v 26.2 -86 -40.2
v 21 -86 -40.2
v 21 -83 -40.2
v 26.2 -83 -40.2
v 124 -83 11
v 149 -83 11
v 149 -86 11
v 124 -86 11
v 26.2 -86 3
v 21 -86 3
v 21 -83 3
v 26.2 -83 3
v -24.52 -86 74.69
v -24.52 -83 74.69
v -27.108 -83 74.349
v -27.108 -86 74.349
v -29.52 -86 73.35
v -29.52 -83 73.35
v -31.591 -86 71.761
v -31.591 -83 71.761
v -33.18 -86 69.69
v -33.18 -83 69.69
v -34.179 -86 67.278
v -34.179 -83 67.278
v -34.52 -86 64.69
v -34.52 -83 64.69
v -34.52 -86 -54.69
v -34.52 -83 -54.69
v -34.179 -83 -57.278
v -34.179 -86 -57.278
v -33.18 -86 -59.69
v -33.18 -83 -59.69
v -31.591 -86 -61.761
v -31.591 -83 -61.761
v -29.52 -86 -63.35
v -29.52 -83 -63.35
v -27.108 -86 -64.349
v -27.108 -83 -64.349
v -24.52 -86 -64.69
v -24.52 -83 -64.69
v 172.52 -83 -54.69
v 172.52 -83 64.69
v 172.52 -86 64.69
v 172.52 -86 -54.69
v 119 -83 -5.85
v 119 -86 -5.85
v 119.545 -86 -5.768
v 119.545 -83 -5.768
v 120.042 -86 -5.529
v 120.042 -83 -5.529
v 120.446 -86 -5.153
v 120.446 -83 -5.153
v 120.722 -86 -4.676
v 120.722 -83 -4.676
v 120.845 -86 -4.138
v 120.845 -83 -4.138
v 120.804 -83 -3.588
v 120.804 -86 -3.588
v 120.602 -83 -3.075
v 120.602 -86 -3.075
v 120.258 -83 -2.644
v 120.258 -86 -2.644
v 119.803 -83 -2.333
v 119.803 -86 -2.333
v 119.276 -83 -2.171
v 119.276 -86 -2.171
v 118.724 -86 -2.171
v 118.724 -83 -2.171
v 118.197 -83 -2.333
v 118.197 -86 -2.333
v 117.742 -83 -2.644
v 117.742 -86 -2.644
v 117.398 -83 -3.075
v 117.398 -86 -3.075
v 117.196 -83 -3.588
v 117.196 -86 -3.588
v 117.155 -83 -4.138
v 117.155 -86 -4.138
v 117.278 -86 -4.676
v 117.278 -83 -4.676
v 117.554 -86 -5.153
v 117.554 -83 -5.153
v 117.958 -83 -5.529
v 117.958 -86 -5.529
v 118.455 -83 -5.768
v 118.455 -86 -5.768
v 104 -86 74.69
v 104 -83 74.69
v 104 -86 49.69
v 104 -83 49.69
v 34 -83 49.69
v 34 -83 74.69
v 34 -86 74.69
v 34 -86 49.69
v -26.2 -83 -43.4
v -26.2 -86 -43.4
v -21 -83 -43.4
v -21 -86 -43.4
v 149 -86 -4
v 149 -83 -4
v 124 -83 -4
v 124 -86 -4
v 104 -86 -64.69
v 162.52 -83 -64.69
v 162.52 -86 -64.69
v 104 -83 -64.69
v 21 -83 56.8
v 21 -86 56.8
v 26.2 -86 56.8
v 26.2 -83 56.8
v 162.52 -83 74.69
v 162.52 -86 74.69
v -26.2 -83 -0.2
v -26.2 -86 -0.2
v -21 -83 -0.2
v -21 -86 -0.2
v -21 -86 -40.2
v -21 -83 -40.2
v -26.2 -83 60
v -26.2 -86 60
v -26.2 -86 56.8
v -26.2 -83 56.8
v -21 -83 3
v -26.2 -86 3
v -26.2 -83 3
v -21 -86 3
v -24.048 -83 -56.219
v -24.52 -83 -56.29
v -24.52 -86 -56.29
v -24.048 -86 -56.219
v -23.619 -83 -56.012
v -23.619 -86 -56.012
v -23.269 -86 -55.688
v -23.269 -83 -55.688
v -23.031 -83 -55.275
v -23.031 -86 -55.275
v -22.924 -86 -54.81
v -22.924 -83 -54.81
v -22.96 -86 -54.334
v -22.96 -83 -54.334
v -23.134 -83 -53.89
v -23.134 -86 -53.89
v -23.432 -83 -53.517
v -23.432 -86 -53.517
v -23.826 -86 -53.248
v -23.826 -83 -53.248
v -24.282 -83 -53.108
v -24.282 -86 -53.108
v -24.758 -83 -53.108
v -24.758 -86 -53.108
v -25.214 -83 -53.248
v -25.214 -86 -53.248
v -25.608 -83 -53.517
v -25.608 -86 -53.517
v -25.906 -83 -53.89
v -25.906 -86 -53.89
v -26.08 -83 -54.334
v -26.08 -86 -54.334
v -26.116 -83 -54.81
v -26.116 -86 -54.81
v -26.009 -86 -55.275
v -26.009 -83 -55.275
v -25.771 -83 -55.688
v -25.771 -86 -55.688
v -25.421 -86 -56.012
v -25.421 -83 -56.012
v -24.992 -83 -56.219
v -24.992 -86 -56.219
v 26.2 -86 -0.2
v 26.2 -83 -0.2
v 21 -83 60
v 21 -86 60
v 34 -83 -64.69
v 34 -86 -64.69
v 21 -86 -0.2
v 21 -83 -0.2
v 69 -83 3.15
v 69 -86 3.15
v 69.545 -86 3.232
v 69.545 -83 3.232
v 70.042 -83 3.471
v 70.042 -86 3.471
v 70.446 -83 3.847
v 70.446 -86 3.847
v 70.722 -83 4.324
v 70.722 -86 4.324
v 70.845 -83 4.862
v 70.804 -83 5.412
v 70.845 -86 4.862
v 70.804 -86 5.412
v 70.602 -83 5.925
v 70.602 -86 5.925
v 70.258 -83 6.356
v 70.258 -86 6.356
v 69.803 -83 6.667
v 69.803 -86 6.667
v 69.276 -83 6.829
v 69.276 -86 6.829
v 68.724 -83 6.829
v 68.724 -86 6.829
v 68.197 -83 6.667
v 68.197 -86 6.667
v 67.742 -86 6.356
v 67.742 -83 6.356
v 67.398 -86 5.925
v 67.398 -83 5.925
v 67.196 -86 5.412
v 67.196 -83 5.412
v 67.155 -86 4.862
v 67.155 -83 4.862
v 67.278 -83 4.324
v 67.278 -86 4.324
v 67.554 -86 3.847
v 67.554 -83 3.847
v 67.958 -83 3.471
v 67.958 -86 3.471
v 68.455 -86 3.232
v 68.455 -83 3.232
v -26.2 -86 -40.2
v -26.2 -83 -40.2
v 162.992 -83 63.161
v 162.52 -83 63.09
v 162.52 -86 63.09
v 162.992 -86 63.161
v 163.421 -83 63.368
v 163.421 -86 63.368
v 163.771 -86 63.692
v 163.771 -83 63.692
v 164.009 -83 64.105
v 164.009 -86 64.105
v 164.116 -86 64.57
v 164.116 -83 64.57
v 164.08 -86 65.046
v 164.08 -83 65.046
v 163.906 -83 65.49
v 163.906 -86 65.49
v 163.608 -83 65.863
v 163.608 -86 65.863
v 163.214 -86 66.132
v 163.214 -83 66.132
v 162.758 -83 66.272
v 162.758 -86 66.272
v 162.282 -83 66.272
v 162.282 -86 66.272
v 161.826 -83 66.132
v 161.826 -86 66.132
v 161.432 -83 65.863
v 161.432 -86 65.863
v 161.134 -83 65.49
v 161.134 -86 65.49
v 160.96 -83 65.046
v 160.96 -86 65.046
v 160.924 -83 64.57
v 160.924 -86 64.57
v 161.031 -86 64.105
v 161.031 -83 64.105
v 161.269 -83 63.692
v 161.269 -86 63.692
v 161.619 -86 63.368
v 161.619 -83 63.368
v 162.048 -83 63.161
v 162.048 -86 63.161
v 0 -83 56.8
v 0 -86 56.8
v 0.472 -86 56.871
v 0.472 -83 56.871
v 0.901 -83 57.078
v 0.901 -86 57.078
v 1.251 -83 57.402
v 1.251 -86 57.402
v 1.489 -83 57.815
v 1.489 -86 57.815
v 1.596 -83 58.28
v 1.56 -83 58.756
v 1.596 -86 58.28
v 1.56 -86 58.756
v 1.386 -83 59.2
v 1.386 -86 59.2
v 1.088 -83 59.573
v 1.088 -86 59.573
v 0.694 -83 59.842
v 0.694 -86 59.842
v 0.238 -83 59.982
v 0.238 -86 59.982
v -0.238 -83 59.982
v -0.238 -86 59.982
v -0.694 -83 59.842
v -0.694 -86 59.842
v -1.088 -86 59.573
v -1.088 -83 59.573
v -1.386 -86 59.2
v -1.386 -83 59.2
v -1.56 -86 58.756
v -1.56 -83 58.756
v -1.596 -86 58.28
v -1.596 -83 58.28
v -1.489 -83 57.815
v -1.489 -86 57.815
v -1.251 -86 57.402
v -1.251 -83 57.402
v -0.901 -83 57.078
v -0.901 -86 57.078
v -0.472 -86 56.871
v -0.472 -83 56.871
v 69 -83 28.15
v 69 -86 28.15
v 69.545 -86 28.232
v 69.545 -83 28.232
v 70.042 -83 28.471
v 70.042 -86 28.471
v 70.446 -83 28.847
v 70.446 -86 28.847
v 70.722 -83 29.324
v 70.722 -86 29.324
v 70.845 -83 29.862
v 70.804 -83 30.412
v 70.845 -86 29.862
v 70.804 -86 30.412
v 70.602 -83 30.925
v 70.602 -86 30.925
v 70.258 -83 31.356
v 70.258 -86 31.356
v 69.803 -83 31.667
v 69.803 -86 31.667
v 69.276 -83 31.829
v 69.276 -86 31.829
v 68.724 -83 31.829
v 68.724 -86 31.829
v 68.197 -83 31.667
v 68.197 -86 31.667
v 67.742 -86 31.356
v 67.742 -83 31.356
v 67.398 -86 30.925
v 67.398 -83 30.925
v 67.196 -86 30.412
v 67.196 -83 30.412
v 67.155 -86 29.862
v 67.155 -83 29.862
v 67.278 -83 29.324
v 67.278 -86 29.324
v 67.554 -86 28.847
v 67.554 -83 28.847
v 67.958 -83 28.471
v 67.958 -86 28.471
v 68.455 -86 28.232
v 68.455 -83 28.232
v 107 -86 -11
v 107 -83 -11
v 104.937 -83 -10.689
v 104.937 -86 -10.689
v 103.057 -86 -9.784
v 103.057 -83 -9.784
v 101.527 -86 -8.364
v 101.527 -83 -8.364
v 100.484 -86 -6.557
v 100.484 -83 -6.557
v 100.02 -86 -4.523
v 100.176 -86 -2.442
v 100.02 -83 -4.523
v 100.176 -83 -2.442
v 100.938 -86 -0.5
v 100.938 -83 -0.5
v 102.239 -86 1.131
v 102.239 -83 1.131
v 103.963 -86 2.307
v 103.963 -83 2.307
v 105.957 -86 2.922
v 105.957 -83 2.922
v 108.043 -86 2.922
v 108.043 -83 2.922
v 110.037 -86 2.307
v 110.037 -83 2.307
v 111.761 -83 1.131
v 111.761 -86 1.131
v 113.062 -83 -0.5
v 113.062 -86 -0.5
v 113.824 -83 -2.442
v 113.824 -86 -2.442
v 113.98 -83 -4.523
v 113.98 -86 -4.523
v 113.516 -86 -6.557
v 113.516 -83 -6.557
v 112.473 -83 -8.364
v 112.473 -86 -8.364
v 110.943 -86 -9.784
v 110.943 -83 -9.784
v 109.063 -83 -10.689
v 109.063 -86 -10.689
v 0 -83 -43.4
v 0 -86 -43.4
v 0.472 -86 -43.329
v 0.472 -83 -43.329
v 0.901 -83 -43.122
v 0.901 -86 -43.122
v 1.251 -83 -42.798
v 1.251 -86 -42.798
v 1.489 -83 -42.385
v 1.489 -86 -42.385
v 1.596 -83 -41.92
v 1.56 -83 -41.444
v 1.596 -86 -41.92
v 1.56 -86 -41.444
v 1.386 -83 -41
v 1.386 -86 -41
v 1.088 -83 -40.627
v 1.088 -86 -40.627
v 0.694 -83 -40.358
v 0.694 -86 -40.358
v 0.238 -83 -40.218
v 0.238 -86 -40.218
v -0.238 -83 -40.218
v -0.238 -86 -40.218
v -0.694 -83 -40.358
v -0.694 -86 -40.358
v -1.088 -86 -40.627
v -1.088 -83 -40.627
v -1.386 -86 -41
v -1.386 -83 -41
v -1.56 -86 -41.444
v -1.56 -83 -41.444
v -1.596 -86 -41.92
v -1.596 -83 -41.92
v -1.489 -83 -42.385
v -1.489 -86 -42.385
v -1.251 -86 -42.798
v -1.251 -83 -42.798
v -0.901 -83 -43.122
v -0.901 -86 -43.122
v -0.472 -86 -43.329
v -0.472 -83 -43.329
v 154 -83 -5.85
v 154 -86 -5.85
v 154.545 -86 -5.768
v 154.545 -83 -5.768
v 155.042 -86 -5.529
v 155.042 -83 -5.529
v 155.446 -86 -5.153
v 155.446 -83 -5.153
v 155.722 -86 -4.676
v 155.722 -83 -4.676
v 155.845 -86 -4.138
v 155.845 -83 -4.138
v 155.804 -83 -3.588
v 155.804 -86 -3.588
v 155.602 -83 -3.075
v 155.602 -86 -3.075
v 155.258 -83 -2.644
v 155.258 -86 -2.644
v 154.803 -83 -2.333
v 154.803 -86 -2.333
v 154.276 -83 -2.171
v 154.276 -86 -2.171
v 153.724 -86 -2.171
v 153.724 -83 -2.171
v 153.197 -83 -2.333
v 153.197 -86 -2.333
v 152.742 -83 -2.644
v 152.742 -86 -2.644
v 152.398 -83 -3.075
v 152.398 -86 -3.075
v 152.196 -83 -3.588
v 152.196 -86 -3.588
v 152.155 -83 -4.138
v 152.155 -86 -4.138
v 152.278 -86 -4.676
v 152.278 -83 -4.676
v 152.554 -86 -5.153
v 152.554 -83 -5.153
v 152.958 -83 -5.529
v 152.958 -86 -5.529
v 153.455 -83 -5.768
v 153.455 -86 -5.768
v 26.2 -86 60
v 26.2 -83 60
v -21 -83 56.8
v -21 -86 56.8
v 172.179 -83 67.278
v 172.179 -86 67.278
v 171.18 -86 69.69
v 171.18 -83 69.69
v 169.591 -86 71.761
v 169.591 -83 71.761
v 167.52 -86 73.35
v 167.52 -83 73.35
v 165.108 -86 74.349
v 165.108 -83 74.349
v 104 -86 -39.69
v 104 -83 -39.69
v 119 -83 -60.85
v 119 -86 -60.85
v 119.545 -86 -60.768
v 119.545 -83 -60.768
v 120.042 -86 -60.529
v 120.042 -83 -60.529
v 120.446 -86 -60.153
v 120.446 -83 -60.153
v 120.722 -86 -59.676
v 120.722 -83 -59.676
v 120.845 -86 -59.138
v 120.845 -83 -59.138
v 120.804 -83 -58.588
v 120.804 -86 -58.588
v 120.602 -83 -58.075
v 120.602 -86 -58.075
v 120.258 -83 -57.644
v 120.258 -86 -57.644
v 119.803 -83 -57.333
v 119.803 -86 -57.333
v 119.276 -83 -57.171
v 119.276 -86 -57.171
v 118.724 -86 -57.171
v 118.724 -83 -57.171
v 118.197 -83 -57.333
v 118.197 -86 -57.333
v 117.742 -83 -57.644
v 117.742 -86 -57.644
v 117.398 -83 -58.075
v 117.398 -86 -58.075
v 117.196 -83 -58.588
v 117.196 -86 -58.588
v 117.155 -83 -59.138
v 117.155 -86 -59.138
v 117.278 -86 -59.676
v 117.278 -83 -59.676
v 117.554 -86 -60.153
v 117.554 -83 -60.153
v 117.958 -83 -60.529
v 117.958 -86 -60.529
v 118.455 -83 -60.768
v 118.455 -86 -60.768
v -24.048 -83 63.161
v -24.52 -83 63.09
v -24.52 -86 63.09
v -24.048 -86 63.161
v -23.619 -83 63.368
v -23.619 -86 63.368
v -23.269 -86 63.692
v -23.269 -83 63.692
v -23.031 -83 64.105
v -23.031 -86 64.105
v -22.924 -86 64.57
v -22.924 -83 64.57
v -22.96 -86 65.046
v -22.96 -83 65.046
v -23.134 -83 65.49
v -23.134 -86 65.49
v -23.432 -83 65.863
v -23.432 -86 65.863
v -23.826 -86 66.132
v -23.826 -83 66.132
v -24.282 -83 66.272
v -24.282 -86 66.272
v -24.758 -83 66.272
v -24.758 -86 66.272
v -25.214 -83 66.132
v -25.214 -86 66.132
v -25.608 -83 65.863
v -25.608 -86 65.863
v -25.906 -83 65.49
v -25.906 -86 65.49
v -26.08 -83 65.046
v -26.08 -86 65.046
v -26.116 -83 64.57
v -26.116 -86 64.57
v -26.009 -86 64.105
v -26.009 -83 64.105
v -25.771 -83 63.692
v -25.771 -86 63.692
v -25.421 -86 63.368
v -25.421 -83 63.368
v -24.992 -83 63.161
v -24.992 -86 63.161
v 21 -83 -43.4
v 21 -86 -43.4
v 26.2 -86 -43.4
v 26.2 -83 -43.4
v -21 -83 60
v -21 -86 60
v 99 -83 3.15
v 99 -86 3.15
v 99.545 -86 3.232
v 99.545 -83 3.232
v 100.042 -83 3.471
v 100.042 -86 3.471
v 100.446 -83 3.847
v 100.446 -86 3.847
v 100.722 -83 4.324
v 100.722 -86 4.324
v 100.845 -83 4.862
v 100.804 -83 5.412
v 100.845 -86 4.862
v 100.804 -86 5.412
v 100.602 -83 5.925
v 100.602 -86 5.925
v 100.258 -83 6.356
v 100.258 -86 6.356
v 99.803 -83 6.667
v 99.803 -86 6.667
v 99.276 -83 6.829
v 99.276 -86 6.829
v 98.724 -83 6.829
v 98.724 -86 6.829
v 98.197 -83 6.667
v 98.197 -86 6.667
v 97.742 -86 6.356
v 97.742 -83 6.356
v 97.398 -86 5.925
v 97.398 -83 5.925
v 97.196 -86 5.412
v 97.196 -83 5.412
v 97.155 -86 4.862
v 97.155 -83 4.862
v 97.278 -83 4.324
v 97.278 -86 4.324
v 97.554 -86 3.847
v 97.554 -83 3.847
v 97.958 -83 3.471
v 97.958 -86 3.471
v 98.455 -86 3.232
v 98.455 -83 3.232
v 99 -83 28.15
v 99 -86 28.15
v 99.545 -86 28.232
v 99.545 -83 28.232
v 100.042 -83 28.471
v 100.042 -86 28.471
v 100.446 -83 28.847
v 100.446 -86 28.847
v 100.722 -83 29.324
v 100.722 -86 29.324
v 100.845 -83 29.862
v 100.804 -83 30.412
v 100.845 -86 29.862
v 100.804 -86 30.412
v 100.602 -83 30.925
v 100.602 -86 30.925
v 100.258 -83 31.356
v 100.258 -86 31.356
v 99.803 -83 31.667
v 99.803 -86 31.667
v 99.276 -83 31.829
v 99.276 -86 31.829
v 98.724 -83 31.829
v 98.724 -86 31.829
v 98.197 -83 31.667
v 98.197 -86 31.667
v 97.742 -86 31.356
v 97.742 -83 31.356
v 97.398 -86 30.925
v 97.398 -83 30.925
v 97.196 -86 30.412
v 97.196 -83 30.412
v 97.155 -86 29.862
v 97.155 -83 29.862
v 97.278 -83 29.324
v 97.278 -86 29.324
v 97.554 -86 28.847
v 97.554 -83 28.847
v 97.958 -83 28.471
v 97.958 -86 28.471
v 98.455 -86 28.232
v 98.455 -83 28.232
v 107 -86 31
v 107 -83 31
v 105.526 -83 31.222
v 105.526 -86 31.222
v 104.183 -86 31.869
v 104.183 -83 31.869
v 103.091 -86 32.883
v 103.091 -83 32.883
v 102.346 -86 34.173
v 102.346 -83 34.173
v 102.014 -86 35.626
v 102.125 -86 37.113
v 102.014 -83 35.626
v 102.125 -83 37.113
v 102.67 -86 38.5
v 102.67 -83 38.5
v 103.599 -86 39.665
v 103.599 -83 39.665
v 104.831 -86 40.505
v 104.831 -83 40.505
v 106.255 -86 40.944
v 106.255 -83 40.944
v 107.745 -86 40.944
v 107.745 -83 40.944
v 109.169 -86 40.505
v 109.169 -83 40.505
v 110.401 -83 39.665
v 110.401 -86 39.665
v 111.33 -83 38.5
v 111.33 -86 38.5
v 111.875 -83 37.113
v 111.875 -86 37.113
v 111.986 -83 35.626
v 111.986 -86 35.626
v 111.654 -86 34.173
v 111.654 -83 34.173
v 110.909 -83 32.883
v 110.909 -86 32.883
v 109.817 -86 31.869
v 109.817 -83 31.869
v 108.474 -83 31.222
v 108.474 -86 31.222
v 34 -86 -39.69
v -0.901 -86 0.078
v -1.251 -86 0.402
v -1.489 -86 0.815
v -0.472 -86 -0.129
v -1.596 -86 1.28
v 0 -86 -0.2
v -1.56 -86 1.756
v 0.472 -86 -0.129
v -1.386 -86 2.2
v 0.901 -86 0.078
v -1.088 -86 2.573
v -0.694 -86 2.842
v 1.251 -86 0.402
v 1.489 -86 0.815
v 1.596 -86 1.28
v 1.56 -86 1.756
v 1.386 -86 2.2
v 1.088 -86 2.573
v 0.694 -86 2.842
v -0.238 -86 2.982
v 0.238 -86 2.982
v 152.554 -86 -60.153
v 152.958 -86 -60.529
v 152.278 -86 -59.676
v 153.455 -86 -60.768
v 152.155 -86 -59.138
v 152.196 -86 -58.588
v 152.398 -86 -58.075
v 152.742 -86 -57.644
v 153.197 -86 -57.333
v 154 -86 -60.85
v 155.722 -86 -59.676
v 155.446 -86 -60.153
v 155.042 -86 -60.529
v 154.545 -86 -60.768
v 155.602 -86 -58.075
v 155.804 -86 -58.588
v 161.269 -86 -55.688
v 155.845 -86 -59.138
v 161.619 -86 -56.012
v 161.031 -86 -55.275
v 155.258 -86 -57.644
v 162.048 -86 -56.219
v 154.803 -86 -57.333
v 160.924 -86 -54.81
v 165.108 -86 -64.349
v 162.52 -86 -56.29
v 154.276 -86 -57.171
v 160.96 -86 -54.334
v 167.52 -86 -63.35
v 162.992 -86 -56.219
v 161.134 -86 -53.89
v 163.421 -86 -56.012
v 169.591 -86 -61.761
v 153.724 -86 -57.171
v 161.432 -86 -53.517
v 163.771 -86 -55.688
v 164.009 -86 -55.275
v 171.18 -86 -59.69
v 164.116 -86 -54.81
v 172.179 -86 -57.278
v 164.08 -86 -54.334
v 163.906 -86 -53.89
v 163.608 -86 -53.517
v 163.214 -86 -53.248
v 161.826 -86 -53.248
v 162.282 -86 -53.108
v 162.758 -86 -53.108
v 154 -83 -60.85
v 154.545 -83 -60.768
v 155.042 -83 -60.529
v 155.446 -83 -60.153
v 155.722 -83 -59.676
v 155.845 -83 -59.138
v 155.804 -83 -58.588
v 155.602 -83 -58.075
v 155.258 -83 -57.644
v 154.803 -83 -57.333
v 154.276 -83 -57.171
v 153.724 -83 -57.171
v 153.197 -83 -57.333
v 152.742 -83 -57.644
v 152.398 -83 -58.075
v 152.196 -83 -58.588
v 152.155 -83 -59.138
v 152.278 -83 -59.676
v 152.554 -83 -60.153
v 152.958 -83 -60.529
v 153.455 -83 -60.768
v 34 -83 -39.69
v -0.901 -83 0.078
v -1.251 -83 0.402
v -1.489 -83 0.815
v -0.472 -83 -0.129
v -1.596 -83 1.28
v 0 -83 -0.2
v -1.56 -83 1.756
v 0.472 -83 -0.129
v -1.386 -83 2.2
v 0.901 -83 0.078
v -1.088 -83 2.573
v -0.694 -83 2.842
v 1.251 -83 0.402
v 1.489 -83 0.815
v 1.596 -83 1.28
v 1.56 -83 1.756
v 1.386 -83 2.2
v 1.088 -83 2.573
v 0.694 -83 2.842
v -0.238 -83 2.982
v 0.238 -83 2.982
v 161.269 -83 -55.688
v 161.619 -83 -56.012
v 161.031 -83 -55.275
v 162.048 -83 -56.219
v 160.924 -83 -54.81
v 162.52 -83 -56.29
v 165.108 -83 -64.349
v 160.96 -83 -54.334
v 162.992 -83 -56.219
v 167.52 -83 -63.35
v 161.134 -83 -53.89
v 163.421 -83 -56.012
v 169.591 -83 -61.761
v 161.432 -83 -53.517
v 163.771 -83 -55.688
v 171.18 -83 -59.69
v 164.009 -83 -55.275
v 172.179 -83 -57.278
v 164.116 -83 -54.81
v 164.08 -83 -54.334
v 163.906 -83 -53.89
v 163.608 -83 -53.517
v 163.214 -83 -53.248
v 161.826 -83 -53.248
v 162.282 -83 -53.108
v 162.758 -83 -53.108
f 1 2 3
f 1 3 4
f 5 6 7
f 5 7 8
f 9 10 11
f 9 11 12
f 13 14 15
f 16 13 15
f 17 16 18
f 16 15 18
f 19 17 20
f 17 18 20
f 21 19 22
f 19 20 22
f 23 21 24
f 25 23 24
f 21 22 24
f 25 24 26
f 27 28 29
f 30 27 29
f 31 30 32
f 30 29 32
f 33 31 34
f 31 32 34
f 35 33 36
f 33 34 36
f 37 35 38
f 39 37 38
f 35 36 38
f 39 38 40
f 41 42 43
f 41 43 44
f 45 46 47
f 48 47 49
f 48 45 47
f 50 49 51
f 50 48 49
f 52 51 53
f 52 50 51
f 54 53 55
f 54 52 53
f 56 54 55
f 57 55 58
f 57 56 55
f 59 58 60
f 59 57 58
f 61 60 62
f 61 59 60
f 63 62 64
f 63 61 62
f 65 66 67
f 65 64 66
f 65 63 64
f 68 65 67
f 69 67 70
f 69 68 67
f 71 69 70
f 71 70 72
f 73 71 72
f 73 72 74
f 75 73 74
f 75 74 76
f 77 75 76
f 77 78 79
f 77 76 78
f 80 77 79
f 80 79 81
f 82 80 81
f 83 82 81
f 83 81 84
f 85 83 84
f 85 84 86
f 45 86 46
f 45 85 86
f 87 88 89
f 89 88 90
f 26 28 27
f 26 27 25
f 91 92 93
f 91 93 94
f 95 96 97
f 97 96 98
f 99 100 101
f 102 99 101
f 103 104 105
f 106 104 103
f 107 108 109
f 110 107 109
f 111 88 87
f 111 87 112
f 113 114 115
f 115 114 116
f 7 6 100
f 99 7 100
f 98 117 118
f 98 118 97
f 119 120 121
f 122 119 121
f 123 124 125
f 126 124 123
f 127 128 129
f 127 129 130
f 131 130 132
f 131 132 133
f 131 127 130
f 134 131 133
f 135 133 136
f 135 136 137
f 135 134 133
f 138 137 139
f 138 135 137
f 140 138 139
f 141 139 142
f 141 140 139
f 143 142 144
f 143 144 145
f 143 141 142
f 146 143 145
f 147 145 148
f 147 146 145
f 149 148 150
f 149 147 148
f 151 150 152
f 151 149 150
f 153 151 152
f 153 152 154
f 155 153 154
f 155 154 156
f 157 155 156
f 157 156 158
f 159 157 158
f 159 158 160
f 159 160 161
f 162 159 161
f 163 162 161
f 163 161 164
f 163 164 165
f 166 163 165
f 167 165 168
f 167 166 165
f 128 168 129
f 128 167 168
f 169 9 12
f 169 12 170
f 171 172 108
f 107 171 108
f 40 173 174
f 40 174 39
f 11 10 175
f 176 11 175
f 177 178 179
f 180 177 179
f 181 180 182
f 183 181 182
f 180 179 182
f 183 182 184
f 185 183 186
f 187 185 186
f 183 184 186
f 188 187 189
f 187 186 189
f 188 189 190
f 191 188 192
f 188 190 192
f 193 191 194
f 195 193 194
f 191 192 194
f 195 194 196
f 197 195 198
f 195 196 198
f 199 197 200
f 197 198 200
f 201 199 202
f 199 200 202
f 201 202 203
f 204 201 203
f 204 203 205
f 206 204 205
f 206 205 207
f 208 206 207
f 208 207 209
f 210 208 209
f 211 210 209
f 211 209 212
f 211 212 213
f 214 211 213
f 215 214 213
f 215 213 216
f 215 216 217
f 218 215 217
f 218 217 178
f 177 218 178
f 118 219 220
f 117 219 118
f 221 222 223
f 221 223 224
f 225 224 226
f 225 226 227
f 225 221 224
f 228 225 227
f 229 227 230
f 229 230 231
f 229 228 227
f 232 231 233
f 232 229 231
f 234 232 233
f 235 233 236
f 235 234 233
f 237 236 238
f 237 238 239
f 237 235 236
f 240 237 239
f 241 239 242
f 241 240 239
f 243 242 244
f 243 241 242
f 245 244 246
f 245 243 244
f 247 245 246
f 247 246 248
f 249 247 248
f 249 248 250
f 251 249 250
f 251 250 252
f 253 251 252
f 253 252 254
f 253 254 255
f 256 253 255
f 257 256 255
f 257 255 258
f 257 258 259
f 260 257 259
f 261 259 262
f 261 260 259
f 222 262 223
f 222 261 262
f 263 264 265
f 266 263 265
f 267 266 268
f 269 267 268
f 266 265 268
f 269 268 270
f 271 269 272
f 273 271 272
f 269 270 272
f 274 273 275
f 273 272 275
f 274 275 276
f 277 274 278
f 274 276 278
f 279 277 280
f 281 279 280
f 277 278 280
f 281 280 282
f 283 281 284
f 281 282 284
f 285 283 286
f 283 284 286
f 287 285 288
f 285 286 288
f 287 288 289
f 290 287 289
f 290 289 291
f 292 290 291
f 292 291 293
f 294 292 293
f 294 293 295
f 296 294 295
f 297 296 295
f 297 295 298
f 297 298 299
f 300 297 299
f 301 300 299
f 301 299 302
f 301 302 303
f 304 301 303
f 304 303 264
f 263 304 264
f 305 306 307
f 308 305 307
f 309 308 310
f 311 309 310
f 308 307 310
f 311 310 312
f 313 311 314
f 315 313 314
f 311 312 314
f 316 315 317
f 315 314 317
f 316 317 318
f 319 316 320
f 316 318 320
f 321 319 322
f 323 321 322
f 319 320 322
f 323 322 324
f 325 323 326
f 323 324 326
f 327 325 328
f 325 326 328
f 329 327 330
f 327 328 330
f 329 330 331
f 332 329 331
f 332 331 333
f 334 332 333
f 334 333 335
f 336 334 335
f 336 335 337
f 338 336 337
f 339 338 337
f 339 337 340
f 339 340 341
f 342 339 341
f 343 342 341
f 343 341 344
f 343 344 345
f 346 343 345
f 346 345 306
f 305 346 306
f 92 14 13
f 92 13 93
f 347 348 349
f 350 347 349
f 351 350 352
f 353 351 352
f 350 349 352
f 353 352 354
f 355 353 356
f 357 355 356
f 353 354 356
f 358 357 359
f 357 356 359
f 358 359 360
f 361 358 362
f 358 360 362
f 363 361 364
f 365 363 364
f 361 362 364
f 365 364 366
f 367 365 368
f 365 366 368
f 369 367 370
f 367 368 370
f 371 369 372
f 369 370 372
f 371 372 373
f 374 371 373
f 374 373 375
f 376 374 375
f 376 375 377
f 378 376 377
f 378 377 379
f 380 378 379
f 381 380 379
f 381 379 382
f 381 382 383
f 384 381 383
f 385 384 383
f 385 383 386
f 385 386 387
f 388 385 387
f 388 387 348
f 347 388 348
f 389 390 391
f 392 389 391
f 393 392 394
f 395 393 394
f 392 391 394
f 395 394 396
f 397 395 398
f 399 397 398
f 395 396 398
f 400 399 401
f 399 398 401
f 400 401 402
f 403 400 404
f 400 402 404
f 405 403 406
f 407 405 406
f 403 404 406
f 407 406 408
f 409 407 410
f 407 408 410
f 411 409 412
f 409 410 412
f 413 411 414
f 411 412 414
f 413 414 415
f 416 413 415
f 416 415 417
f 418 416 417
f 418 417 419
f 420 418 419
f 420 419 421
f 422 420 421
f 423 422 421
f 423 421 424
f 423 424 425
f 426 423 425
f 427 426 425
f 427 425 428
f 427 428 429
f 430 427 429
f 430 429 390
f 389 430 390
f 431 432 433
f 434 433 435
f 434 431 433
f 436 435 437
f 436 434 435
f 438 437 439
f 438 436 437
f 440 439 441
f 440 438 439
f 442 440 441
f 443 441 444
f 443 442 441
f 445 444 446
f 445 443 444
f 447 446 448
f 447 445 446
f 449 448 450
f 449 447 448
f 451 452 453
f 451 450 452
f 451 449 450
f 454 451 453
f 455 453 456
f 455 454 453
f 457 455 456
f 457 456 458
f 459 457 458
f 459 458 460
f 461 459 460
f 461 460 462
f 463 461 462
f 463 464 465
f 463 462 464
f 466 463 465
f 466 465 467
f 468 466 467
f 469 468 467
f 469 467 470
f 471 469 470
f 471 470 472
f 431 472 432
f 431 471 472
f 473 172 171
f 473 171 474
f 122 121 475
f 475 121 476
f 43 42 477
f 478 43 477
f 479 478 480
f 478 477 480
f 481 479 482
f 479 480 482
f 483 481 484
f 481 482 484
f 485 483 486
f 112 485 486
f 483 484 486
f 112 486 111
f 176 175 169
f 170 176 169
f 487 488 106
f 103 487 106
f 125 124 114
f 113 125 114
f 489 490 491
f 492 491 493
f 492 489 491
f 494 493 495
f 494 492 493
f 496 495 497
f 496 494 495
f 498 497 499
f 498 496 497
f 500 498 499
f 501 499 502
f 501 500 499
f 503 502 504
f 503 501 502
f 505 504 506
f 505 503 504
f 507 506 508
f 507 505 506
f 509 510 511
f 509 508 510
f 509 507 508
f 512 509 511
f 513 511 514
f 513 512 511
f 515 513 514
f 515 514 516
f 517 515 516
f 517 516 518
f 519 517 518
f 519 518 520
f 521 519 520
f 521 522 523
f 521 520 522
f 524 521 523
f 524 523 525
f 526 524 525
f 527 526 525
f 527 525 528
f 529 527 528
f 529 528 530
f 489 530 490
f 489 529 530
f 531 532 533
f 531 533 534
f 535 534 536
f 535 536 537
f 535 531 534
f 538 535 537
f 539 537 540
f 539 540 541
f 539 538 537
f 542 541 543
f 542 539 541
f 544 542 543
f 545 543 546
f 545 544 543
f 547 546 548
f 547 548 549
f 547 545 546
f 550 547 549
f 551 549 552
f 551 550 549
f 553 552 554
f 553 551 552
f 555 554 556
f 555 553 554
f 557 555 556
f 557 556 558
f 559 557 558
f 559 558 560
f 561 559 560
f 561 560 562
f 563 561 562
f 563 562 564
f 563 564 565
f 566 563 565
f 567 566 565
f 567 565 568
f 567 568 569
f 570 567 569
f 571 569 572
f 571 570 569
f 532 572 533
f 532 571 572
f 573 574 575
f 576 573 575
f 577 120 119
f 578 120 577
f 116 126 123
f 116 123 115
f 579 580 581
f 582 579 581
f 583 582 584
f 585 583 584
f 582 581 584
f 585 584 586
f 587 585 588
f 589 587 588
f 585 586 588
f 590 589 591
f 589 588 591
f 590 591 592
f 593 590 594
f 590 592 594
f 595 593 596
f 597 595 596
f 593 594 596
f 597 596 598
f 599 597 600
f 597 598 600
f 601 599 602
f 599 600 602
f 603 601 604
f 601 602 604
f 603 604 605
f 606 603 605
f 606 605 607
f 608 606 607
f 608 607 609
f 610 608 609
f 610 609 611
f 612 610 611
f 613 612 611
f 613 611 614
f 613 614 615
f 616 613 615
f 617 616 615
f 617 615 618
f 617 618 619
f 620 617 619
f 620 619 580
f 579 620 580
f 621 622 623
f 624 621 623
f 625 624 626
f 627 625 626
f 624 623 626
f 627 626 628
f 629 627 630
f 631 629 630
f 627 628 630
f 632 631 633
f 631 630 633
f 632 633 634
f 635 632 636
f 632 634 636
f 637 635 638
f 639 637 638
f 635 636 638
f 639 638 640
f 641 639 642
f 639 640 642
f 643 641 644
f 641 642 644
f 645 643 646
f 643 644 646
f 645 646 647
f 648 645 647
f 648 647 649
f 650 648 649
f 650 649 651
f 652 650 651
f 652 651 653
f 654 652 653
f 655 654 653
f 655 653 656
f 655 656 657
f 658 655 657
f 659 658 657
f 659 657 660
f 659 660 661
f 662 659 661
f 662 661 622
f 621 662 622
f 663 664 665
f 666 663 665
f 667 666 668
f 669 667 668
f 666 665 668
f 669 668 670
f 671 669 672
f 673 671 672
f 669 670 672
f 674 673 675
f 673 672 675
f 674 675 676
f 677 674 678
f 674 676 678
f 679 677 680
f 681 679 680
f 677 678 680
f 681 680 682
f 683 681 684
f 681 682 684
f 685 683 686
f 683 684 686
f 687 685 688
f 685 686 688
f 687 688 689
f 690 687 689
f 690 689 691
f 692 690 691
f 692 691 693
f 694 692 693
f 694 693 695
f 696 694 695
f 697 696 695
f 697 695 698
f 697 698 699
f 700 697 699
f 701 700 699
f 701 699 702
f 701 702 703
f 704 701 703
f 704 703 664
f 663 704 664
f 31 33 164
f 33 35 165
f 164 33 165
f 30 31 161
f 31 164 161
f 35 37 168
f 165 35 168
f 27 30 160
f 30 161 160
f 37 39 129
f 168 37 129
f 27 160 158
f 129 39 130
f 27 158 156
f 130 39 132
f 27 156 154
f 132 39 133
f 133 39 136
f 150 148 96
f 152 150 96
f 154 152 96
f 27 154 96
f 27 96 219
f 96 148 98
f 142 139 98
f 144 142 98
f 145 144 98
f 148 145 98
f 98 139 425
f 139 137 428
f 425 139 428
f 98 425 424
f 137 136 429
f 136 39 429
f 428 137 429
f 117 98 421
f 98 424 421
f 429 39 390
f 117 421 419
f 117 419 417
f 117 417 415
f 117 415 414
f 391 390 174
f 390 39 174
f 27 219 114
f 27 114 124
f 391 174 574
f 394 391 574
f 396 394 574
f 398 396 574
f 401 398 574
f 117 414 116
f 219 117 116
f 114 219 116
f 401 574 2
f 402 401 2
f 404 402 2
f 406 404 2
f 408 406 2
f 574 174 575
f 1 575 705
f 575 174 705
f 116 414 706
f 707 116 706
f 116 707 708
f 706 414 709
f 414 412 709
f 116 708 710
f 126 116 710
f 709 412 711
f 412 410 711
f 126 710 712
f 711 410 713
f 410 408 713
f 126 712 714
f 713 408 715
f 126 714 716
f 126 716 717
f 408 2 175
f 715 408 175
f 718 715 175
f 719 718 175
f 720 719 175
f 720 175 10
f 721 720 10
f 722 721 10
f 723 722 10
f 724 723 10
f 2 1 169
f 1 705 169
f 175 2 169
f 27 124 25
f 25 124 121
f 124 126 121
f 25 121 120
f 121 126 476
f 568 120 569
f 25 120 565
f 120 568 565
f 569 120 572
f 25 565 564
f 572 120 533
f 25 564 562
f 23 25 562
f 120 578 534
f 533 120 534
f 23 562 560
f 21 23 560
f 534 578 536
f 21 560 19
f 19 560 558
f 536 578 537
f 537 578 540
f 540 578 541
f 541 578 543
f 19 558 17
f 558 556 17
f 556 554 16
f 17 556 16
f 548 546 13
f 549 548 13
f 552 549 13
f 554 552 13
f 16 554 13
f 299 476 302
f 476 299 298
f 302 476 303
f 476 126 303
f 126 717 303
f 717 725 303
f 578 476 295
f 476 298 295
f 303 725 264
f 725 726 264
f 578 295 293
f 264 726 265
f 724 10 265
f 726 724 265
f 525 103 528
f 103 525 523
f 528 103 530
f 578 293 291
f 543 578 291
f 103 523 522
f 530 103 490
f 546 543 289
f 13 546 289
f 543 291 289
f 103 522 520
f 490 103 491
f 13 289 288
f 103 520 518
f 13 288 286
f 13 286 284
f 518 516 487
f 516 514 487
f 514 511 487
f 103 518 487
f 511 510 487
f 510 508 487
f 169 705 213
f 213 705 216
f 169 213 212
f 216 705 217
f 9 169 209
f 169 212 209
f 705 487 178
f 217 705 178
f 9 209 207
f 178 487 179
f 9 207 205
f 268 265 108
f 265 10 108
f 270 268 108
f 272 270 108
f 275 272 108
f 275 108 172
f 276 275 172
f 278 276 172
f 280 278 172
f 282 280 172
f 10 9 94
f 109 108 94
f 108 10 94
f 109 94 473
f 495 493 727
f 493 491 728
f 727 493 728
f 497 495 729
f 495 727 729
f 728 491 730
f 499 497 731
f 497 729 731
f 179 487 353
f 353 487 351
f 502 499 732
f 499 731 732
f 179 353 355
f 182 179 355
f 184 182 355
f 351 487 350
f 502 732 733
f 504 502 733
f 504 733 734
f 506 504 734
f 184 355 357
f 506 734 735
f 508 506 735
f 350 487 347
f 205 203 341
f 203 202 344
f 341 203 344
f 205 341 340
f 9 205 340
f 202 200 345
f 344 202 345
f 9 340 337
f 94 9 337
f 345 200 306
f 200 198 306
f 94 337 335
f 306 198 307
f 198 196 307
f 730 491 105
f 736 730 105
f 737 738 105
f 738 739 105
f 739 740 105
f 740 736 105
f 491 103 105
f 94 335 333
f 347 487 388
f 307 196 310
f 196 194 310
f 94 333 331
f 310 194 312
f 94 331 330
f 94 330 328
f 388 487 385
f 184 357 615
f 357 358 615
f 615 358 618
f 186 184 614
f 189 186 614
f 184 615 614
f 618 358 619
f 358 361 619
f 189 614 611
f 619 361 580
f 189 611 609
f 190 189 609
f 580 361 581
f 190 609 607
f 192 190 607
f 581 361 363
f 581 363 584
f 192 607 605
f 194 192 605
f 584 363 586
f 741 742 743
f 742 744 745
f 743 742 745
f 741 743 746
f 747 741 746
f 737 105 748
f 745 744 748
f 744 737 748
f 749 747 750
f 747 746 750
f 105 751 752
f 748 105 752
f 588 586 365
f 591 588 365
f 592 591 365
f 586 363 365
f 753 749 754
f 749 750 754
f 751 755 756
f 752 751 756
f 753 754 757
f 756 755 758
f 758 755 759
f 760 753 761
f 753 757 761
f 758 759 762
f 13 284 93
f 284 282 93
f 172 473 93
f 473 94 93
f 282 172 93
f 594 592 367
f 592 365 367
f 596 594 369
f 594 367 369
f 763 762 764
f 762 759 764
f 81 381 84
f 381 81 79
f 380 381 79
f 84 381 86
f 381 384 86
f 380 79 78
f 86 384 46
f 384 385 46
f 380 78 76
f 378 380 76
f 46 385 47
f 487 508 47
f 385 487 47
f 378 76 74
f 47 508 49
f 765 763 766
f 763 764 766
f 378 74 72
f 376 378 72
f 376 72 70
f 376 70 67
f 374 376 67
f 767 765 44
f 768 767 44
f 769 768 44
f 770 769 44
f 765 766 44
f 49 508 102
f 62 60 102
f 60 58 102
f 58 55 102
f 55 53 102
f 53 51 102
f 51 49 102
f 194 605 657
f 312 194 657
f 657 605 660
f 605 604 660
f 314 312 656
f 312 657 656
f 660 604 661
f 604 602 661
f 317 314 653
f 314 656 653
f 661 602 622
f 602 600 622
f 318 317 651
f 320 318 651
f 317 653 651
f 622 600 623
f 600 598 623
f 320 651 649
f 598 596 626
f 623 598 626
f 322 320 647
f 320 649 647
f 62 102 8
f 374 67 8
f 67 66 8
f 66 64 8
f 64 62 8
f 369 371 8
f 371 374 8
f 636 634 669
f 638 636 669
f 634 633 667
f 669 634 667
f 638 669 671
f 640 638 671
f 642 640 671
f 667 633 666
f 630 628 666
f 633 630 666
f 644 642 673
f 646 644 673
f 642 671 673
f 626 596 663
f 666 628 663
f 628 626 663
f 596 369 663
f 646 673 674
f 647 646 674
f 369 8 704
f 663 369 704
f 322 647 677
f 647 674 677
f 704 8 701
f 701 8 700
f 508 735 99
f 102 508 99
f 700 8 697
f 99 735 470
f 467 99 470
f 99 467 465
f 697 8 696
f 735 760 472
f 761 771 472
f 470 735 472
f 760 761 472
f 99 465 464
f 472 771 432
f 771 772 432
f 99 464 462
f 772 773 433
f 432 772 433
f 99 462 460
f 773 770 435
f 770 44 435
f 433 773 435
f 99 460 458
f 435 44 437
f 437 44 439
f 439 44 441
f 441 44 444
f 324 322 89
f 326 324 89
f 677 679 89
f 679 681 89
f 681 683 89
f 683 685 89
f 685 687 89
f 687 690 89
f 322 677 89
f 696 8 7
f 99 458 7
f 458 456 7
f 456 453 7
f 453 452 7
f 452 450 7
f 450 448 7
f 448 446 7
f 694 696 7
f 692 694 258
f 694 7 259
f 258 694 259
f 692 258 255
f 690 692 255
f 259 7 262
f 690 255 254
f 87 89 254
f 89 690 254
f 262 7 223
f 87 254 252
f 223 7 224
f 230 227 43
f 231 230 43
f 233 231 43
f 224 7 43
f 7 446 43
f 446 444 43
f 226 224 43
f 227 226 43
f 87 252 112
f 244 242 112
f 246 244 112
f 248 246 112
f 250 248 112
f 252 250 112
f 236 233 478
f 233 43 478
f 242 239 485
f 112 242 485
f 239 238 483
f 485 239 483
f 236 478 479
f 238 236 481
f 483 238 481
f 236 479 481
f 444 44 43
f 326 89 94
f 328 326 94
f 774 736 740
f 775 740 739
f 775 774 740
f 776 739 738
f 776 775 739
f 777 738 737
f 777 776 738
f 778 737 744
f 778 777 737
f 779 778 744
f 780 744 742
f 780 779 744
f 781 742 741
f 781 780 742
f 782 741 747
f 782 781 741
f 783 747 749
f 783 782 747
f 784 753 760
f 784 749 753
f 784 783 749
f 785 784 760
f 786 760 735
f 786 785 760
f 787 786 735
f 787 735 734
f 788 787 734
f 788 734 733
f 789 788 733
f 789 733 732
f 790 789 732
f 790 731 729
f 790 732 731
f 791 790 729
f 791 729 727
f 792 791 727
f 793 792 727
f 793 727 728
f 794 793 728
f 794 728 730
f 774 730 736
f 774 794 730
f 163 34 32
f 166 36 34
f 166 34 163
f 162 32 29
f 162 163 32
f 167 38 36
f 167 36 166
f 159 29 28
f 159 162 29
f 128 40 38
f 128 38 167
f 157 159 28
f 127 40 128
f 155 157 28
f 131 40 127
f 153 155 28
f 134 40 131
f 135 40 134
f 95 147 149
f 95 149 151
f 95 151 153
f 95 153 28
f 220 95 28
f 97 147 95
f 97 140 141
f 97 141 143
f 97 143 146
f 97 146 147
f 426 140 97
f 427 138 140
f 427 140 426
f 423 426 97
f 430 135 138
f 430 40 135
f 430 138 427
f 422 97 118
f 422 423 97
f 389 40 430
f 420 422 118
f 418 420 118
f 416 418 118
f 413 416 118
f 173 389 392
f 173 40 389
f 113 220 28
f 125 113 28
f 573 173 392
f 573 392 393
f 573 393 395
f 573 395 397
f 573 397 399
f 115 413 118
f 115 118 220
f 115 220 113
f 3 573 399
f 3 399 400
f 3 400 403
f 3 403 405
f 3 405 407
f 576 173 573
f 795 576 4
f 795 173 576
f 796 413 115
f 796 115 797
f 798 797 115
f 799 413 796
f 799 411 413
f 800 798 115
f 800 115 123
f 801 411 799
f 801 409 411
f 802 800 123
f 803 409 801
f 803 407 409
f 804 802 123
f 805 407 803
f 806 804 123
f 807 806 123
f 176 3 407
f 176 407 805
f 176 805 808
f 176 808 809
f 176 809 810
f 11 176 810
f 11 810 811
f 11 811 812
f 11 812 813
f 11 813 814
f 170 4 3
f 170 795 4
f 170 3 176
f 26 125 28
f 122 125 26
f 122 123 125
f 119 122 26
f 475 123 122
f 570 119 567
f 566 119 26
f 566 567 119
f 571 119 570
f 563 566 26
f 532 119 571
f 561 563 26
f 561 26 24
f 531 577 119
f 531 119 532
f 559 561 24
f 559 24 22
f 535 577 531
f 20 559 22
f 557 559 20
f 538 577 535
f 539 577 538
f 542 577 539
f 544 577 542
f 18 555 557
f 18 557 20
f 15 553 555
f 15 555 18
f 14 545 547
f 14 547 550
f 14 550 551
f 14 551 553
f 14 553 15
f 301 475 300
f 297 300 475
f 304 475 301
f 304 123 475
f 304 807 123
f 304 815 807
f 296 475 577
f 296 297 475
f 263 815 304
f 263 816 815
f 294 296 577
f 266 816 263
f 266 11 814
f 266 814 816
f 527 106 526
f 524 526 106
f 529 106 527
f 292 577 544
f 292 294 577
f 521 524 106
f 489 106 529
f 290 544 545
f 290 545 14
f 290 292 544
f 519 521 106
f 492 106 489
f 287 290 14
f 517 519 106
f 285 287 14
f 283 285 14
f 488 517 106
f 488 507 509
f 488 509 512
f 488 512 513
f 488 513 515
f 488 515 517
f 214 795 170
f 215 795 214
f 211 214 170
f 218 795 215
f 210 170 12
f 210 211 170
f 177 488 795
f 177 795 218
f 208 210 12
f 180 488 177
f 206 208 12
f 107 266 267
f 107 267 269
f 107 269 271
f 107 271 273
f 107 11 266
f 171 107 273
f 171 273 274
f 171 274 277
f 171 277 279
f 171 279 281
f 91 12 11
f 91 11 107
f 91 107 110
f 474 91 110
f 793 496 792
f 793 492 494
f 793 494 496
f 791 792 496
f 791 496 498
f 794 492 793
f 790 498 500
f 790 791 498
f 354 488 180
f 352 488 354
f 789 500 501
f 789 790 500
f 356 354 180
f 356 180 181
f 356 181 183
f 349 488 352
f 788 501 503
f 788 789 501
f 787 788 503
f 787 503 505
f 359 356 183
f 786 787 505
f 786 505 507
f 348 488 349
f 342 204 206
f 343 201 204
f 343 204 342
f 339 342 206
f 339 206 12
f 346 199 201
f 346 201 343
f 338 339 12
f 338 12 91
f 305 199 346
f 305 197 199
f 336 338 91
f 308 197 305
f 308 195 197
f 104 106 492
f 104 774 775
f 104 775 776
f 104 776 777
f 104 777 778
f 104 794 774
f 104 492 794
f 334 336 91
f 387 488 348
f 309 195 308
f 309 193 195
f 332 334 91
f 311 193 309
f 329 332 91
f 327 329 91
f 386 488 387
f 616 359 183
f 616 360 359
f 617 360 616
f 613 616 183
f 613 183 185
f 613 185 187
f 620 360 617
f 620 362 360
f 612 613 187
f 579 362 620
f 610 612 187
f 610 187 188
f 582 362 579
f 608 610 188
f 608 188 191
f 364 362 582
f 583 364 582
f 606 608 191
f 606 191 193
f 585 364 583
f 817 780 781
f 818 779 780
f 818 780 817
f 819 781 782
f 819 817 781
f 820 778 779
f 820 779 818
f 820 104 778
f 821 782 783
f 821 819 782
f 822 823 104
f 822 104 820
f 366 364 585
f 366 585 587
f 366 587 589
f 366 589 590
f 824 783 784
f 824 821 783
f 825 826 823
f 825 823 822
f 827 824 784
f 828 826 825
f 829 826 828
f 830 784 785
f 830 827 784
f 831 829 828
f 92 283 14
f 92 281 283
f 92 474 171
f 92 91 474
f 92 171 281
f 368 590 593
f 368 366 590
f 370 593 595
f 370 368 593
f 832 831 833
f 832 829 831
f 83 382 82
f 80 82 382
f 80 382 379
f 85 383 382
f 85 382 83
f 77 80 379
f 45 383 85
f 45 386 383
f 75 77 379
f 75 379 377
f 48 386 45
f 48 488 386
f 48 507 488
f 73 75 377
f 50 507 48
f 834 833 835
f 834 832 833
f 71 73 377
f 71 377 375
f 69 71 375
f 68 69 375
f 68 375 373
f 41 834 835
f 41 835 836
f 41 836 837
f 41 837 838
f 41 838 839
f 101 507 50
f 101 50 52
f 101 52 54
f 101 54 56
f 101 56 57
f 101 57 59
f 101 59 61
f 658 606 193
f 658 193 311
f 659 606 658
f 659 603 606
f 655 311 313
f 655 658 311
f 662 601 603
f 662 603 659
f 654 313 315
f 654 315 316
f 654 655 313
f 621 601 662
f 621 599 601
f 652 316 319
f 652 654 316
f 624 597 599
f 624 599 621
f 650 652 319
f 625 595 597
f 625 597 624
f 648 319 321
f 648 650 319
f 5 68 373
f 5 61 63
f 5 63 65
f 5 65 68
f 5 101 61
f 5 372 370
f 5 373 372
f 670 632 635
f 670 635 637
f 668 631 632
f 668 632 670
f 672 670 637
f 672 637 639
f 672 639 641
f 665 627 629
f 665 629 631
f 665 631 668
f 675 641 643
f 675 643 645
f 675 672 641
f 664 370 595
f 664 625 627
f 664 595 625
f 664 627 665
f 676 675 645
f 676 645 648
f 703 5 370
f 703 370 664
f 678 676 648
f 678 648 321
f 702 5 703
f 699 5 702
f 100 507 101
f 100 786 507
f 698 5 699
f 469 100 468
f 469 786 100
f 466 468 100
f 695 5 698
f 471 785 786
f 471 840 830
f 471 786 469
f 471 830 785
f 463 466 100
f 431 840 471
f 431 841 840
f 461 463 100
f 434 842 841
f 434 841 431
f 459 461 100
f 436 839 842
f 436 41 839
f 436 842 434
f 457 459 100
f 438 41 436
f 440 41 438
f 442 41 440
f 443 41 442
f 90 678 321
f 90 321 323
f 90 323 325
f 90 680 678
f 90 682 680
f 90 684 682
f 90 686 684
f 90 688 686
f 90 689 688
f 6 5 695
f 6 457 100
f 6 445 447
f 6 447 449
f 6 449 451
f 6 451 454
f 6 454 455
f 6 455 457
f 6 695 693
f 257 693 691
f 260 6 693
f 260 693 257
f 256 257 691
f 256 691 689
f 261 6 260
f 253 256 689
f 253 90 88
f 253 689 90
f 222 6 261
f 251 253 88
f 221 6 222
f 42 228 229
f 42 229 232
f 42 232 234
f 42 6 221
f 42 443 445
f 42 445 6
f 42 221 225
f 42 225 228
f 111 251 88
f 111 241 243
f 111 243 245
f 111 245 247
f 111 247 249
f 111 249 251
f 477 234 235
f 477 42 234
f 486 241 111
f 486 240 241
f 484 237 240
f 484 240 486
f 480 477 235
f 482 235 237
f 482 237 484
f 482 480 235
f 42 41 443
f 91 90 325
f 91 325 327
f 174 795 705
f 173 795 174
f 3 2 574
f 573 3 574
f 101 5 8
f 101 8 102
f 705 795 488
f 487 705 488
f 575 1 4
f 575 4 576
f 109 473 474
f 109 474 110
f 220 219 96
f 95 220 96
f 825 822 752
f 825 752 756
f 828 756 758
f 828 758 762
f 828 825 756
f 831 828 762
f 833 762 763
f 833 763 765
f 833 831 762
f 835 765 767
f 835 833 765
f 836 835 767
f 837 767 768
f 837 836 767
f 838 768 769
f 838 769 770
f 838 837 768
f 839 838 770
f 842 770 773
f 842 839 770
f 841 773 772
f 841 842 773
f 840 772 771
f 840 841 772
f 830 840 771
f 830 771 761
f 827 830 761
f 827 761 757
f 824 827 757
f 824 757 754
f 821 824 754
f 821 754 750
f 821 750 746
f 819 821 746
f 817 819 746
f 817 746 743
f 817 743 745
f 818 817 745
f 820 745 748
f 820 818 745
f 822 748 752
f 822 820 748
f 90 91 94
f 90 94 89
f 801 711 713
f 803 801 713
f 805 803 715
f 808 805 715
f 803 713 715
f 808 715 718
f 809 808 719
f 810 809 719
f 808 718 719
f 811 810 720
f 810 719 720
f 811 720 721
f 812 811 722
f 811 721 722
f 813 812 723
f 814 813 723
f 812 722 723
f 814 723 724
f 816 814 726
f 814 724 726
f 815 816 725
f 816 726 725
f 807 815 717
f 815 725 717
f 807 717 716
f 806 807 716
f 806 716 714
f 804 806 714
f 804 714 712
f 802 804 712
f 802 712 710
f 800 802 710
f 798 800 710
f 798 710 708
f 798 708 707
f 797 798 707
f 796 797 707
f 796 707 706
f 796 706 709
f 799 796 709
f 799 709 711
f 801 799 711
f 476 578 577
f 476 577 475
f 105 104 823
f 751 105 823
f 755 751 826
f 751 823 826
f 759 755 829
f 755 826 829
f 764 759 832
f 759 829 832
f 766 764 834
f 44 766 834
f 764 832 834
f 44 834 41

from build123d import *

# Parameters (mm, degrees)
SKETCH009_R             = 1.6
PAD006_DEPTH            = 3
SKETCH010_W             = 25
SKETCH010_H             = 70
POCKET003_DEPTH         = 3.001
SKETCH011_R             = 1.85
POCKET004_DEPTH         = 3.001
SKETCH012_R             = 1.6
SKETCH012_W             = 3.2
SKETCH012_H             = 5.2
POCKET005_DEPTH         = 3.001
SKETCH013_R             = 1.85
POCKET006_DEPTH         = 3.001
SKETCH017_R             = 7
SKETCH017_R_2           = 5
SKETCH017_W             = 15
SKETCH017_H             = 25
POCKET010_DEPTH         = 3.001
BODY003_PLACEMENT_ANGLE = 90


with BuildPart() as part:
    # Sketch009 → Pad006 (new body)
    with BuildSketch(Plane.XZ):
        with BuildLine():
            Line((-59.69, 103.52), (59.69, 103.52))
            ThreePointArc((69.69, 93.52), (66.761068, 100.591068), (59.69, 103.52))
            Line((69.69, 93.52), (69.69, -93.52))
            ThreePointArc((59.69, -103.52), (66.761068, -100.591068), (69.69, -93.52))
            Line((59.69, -103.52), (-59.69, -103.52))
            ThreePointArc((-69.69, -93.52), (-66.761068, -100.591068), (-59.69, -103.52))
            Line((-69.69, -93.52), (-69.69, 93.52))
            ThreePointArc((-59.69, 103.52), (-66.761068, 100.591068), (-69.69, 93.52))
        make_face()
        with Locations((-59.69, 93.52)):
            Circle(SKETCH009_R, mode=Mode.SUBTRACT)
        with Locations((59.69, 93.52)):
            Circle(SKETCH009_R, mode=Mode.SUBTRACT)
        with Locations((59.69, -93.52)):
            Circle(SKETCH009_R, mode=Mode.SUBTRACT)
        with Locations((-59.69, -93.52)):
            Circle(SKETCH009_R, mode=Mode.SUBTRACT)
    extrude(amount=PAD006_DEPTH)

    # Sketch010 → Pocket003 (cut, through all)
    with BuildSketch(Plane.XZ):
        with Locations((-57.19, 0)):
            Rectangle(SKETCH010_W, SKETCH010_H)
        with Locations((57.19, 0)):
            Rectangle(SKETCH010_W, SKETCH010_H)
    extrude(amount=POCKET003_DEPTH, mode=Mode.SUBTRACT)

    # Sketch011 → Pocket004 (cut, through all)
    with BuildSketch(Plane.XZ):
        with Locations((9, 85)):
            Circle(SKETCH011_R)
        with Locations((64, 85)):
            Circle(SKETCH011_R)
        with Locations((64, 50)):
            Circle(SKETCH011_R)
        with Locations((9, 50)):
            Circle(SKETCH011_R)
    extrude(amount=POCKET004_DEPTH, mode=Mode.SUBTRACT)

    # Sketch012 (on Face4 of Pocket004) → Pocket005 (cut, through all)
    with BuildSketch(Plane.XZ.offset(3)):
        with Locations((-53.4, -69)):
            Circle(SKETCH012_R)
        with Locations((3.6, -69)):
            Circle(SKETCH012_R)
        with Locations((46.8, -69)):
            Circle(SKETCH012_R)
        with Locations((-53.4, -45.4)):
            Rectangle(SKETCH012_W, SKETCH012_H)
        with Locations((3.6, -45.4)):
            Rectangle(SKETCH012_W, SKETCH012_H)
        with Locations((3.6, -92.6)):
            Rectangle(SKETCH012_W, SKETCH012_H)
        with Locations((-53.4, -92.6)):
            Rectangle(SKETCH012_W, SKETCH012_H)
        with Locations((46.8, -45.4)):
            Rectangle(SKETCH012_W, SKETCH012_H)
        with Locations((46.8, -92.6)):
            Rectangle(SKETCH012_W, SKETCH012_H)
    extrude(amount=-POCKET005_DEPTH, mode=Mode.SUBTRACT)

    # Sketch013 (on Face4 of Pocket005) → Pocket006 (cut, through all)
    with BuildSketch(Plane.XZ.offset(3)):
        with Locations((-25, 30)):
            Circle(SKETCH013_R)
        with Locations((0, 30)):
            Circle(SKETCH013_R)
        Circle(SKETCH013_R)
        with Locations((-25, 0)):
            Circle(SKETCH013_R)
    extrude(amount=-POCKET006_DEPTH, mode=Mode.SUBTRACT)

    # Sketch017 → Pocket010 (cut, through all)
    with BuildSketch(Plane(origin=(0, 0, 0), x_dir=(1, 0, 0), z_dir=(0, 1, 0))):
        with Locations((9, -38)):
            Circle(SKETCH017_R)
        with Locations((-31, -38)):
            Circle(SKETCH017_R_2)
        with Locations((1.5, -67.5)):
            Rectangle(SKETCH017_W, SKETCH017_H)
    extrude(amount=-POCKET010_DEPTH, mode=Mode.SUBTRACT)


with BuildPart() as part_1:
    # Body003 placement: moved
    add(part.part.moved(Location((69, -83, 5))).rotate(Axis((69, -83, 5), (0, 1, 0)), BODY003_PLACEMENT_ANGLE))


solid = part_1.part
